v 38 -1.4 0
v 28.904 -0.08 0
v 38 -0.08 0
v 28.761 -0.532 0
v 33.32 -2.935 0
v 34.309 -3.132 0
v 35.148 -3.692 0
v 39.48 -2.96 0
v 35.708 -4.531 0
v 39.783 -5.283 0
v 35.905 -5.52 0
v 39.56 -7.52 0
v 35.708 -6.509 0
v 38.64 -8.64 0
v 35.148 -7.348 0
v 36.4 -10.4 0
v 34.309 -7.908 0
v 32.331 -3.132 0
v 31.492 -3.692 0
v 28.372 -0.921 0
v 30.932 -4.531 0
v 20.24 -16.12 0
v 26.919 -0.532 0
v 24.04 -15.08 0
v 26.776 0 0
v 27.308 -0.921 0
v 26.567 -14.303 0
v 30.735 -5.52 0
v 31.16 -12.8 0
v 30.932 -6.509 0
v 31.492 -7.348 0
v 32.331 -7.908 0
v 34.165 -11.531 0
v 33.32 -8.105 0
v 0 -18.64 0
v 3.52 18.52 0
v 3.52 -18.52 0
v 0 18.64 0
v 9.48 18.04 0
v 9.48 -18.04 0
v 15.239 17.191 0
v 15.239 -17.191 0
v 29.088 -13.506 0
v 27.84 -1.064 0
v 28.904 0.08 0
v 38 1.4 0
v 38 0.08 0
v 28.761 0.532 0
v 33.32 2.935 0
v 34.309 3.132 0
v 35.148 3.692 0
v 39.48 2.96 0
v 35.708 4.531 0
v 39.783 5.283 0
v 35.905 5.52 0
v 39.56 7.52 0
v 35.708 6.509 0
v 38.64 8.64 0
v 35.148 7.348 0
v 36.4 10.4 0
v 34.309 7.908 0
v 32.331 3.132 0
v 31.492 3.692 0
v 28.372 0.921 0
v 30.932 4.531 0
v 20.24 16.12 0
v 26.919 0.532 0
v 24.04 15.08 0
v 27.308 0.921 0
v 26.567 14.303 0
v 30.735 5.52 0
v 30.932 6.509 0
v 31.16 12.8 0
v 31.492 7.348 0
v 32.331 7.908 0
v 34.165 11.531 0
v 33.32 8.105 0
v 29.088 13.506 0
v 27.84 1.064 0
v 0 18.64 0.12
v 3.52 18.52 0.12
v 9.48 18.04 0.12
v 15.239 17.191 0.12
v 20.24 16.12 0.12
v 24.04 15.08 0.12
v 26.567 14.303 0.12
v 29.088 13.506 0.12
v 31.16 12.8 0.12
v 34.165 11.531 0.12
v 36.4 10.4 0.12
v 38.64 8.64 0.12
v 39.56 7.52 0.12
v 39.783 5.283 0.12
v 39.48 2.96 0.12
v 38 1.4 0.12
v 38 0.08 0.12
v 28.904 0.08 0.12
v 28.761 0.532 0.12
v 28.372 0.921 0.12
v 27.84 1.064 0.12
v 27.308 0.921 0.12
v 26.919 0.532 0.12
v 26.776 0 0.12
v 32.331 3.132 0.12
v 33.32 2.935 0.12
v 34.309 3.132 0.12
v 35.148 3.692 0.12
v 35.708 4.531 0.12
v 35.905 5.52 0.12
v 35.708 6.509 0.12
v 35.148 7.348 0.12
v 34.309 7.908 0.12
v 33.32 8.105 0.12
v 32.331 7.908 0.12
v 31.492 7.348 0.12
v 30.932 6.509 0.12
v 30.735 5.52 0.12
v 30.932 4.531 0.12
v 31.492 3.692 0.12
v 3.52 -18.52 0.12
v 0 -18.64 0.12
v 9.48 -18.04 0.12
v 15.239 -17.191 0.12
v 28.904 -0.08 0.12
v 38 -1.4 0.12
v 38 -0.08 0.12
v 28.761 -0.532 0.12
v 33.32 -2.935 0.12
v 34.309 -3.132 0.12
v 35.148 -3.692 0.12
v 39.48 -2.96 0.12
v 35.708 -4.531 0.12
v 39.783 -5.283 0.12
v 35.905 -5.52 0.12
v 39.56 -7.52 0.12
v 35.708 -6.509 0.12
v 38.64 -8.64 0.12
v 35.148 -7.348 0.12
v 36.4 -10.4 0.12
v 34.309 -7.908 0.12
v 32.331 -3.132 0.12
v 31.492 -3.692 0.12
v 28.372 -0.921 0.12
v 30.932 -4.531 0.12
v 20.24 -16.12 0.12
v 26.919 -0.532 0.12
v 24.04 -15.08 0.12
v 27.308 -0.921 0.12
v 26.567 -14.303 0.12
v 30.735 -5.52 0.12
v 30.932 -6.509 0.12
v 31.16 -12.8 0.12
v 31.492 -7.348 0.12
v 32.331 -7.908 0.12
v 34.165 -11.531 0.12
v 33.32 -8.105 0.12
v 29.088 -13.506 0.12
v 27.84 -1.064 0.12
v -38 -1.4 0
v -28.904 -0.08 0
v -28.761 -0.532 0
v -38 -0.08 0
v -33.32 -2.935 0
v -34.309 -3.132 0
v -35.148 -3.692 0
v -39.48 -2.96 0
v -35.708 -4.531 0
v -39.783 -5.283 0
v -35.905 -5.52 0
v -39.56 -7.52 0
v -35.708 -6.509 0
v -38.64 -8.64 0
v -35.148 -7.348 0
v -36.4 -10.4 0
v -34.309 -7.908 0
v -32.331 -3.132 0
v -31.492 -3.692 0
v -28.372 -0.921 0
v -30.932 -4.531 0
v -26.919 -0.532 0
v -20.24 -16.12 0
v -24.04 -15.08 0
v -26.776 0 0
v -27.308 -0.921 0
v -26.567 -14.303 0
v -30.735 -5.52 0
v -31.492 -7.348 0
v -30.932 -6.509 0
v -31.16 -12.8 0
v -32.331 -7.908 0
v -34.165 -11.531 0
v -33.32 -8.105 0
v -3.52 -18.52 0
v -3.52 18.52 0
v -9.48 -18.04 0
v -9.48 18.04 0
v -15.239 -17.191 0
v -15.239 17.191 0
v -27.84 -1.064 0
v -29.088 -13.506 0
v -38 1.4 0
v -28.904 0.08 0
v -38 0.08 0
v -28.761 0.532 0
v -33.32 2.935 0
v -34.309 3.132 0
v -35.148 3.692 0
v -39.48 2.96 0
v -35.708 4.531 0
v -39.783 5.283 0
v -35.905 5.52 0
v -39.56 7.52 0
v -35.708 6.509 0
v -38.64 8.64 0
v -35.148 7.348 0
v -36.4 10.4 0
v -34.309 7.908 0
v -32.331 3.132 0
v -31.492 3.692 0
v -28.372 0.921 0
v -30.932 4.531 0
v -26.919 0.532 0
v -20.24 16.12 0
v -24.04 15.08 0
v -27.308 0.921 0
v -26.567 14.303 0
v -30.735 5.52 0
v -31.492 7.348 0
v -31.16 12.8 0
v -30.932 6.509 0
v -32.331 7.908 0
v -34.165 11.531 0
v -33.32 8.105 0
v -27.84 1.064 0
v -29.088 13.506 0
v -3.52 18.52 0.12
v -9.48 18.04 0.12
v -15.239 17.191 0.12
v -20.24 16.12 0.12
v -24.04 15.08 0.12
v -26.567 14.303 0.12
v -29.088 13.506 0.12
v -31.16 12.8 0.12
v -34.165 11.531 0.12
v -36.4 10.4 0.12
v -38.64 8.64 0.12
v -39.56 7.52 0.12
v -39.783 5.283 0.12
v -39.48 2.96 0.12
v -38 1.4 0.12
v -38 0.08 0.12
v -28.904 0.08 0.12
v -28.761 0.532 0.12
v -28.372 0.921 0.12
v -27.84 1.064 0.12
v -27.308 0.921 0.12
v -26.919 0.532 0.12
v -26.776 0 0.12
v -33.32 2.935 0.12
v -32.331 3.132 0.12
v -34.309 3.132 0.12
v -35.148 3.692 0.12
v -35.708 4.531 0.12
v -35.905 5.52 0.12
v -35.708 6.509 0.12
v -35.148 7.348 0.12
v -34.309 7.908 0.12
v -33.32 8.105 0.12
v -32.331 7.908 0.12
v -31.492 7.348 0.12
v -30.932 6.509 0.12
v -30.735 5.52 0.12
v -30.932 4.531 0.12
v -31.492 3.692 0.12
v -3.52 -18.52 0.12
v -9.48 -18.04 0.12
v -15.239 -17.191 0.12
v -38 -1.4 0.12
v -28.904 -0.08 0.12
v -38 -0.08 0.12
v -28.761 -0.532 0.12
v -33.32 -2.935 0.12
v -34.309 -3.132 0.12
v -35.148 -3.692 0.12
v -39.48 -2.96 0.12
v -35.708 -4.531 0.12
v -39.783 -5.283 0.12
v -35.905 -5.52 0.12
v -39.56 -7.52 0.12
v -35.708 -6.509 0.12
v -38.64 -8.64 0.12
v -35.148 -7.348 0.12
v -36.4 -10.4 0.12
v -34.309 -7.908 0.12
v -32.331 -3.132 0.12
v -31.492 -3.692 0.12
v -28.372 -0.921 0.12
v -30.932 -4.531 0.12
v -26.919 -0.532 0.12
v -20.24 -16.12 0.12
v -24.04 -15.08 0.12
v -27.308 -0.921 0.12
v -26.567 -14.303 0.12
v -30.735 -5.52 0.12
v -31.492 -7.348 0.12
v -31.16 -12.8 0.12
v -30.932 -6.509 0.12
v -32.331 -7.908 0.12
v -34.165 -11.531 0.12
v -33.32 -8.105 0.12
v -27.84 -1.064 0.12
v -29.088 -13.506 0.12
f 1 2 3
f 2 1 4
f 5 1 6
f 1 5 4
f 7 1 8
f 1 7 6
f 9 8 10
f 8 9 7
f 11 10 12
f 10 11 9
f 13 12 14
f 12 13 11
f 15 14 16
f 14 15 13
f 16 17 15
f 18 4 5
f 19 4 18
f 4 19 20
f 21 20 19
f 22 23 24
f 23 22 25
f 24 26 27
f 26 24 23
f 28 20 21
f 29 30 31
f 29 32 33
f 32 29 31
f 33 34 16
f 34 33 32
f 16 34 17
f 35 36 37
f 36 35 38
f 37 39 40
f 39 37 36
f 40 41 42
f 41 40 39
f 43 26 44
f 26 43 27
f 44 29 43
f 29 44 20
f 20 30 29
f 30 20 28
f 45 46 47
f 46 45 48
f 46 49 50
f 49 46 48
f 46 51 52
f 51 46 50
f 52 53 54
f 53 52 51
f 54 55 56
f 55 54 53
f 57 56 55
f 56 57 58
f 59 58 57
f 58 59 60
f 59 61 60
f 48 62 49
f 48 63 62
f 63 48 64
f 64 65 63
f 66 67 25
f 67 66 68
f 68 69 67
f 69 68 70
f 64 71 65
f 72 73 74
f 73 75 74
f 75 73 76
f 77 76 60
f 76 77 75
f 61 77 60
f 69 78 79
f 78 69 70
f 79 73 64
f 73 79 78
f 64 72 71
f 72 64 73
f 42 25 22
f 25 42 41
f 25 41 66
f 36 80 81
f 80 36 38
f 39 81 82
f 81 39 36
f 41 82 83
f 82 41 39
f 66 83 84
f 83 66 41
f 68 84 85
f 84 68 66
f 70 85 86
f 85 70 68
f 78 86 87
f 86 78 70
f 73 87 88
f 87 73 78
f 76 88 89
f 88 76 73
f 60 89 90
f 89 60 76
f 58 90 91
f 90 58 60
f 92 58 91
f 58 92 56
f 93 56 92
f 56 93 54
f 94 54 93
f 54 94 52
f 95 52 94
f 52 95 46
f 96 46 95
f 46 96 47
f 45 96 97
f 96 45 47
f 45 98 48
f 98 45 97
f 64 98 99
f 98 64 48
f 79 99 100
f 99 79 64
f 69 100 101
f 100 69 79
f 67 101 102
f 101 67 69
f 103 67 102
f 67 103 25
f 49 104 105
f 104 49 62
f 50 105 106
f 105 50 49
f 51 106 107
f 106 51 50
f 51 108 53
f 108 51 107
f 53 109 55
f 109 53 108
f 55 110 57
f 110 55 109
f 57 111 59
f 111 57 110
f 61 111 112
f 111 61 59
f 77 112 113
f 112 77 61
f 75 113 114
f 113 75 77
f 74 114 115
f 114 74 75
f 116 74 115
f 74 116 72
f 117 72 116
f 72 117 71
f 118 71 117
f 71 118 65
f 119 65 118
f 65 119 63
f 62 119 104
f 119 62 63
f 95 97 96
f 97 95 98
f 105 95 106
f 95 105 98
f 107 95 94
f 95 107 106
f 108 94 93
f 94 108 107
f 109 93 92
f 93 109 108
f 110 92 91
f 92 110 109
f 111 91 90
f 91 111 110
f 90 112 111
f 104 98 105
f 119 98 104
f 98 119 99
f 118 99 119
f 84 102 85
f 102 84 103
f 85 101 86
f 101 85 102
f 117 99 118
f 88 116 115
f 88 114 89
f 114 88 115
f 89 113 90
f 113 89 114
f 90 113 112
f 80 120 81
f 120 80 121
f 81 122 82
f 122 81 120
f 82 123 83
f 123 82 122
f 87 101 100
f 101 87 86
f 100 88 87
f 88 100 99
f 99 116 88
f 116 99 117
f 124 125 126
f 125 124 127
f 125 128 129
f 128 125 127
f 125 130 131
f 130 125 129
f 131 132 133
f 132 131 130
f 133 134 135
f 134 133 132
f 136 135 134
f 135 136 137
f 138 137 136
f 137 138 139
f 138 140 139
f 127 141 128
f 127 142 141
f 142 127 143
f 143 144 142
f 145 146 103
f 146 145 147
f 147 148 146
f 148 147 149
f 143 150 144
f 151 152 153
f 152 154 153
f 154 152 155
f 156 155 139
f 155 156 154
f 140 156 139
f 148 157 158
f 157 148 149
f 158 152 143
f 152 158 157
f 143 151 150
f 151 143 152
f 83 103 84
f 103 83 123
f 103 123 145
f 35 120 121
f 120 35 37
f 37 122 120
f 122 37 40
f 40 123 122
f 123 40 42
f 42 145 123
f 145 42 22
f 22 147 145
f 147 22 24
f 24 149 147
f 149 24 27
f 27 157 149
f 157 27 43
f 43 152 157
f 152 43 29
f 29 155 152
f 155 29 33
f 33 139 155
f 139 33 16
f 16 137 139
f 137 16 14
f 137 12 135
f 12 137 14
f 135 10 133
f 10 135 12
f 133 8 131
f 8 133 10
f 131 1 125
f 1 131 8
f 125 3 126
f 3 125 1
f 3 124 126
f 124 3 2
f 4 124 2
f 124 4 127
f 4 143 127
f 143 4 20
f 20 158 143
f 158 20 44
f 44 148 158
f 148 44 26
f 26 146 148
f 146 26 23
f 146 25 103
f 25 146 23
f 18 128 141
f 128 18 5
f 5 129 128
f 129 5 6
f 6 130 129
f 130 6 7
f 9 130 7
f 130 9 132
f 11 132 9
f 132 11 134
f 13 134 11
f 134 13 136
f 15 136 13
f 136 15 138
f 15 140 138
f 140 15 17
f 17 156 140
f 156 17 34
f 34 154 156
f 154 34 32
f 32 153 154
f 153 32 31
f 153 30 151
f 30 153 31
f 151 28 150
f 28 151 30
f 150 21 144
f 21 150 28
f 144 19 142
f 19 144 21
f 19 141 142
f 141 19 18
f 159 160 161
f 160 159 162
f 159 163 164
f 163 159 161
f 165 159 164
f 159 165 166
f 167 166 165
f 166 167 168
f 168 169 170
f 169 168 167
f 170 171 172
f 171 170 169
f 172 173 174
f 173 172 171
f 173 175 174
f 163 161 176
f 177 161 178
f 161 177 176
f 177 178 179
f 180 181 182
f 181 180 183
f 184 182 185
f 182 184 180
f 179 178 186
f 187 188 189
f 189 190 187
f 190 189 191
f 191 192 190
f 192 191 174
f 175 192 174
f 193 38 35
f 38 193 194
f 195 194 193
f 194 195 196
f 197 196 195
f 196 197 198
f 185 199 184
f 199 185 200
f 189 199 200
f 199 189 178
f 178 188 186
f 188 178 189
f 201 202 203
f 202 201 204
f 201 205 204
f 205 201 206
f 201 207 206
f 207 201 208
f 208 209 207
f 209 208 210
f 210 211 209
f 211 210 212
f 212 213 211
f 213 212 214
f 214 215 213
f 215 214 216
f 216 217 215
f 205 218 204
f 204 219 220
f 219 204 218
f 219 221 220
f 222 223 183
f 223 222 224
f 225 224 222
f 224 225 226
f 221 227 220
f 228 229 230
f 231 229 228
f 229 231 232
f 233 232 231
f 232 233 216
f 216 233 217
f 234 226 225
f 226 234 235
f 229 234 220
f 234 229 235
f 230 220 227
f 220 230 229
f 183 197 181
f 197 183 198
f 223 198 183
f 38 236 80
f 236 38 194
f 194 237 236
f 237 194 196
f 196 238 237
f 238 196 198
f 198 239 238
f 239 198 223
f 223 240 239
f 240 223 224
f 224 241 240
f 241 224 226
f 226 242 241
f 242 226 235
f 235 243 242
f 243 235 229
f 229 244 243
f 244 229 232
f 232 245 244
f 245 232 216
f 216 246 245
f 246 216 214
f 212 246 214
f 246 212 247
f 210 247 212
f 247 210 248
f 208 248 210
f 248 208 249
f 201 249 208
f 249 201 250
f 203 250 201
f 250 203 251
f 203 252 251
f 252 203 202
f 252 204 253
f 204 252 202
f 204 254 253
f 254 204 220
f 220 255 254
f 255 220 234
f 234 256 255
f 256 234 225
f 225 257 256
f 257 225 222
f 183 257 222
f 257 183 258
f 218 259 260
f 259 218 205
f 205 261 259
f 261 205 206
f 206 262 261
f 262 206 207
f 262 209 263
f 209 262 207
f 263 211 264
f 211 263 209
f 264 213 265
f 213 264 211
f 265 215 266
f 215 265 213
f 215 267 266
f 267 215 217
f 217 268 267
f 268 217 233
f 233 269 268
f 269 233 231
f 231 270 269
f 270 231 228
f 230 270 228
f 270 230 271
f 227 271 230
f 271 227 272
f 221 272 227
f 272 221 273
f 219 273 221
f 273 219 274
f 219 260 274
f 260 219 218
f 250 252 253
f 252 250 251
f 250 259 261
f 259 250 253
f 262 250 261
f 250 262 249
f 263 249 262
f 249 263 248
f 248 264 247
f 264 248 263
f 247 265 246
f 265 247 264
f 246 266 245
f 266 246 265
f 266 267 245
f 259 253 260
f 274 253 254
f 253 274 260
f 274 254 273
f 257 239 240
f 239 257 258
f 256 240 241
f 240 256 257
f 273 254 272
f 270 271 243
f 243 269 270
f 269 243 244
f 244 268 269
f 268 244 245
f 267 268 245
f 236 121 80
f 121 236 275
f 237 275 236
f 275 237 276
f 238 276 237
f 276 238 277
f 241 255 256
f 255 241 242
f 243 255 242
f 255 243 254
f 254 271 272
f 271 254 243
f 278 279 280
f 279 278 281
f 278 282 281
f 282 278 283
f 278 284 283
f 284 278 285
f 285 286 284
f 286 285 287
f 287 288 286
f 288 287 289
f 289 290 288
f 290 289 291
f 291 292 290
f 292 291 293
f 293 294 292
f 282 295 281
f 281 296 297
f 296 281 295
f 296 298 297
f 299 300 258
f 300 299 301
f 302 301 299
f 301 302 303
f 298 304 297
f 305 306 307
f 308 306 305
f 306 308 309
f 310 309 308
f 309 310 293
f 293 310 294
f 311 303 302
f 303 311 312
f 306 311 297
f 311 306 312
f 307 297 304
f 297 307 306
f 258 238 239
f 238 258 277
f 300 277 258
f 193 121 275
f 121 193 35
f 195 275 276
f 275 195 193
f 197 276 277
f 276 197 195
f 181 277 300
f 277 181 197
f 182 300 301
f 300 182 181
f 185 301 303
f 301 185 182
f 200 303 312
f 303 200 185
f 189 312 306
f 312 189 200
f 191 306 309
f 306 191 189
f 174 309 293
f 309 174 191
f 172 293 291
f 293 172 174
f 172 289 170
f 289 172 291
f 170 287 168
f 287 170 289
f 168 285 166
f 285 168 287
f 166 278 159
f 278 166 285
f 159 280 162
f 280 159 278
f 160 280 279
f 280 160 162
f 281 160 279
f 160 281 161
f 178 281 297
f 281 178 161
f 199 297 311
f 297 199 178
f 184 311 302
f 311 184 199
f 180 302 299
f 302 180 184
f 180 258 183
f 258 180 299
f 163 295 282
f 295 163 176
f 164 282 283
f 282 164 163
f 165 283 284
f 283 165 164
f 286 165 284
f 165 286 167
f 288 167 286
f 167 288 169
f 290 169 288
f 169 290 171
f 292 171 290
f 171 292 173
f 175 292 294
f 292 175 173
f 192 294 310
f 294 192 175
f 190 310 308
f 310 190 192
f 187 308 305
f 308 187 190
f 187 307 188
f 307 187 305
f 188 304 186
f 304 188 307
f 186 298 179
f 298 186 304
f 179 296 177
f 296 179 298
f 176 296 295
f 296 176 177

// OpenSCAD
// file: ../p/rect3.scad
use <../lib.scad>
function ldraw_lib__rect3() = [
// 0 Rectangle with 3 Edges
// 0 Name: rect3.dat
// 0 Author: Mark Kennedy [mkennedy]
// 0 !LDRAW_ORG Primitive UPDATE 2010-01
// 0 !LICENSE Licensed under CC BY 4.0 : see CAreadme.txt
// 
// 0 BFC CERTIFY CCW
  [0,"BFC","CERTIFY"],
  [0,"BFC","CCW"],
// 
// 0 !HISTORY 2003-08-01 [PTadmin] Official Update 2003-02
// 0 !HISTORY 2007-06-24 [PTadmin] Header formatted for Contributor Agreement
// 0 !HISTORY 2008-07-01 [PTadmin] Official Update 2008-01
// 0 !HISTORY 2010-01-17 [mikeheide] Change winding to CCW
// 0 !HISTORY 2010-04-05 [PTadmin] Official Update 2010-01
// 
// 
// 2 24 1 0 1 -1 0 1
  [2,24,1,0,1,-1,0,1],
// 2 24 1 0 1 1 0 -1
  [2,24,1,0,1,1,0,-1],
// 2 24 -1 0 1 -1 0 -1
  [2,24,-1,0,1,-1,0,-1],
// 4 16 -1 0 1 -1 0 -1 1 0 -1 1 0 1
  [4,16,-1,0,1,-1,0,-1,1,0,-1,1,0,1],
// 0 //
];
module ldraw_lib__rect3(step=0, col=false, unit=2/5, alt=false, line=0.2, solid=!$preview)
    makepoly(ldraw_lib__rect3(), step=step, col=col, unit=unit, alt=alt, line=line, solid=solid);
ldraw_lib__rect3(line=0.2);
// main file
use <../lib.scad>
use <s/28981s01.scad>
function ldraw_lib__28981() = [
// 0 Sheet Fabric Oval 10 x  5
// 0 Name: 28981.dat
// 0 Author: Philippe Hurbain [Philo]
// 0 !LDRAW_ORG Part UPDATE 2020-02
// 0 !LICENSE Licensed under CC BY 4.0 : see CAreadme.txt
// 
// 0 BFC CERTIFY CCW
  [0,"BFC","CERTIFY"],
  [0,"BFC","CCW"],
// 
// 0 !CATEGORY Sheet Fabric
// 0 !KEYWORDS Hammock, Set 31063, Set 60153
// 
// 0 !HISTORY 2019-06-28 [PTadmin] Official Update 2019-01
// 0 !HISTORY 2020-06-10 [cwdee] Update description
// 0 !HISTORY 2020-09-05 [PTadmin] Official Update 2020-02
// 
// 
// 1 16 0 0 0 1 0 0 0 1 0 0 0 1 s\28981s01.dat
  [1,16,0,0,0,1,0,0,0,1,0,0,0,1, ldraw_lib__s__28981s01()],
// 1 16 0 -0.3 0 1 0 0 0 -1 0 0 0 -1 s\28981s01.dat
  [1,16,0,-0.3,0,1,0,0,0,-1,0,0,0,-1, ldraw_lib__s__28981s01()],
// 1 16 0 0 0 -1 0 0 0 1 0 0 0 1 s\28981s01.dat
  [1,16,0,0,0,-1,0,0,0,1,0,0,0,1, ldraw_lib__s__28981s01()],
// 1 16 0 -0.3 0 -1 0 0 0 -1 0 0 0 -1 s\28981s01.dat
  [1,16,0,-0.3,0,-1,0,0,0,-1,0,0,0,-1, ldraw_lib__s__28981s01()],
// 5 24 0 0 46.6 0 -0.3 46.6 8.8 -0.3 46.3 -8.8 0 46.3
  [5,24,0,0,46.6,0,-0.3,46.6,8.8,-0.3,46.3,-8.8,0,46.3],
// 5 24 66.941 -0.3 0 66.941 0 0 67.2972 0 1.3295 67.2972 -0.3 -1.3295
  [5,24,66.941,-0.3,0,66.941,0,0,67.2972,0,1.3295,67.2972,-0.3,-1.3295],
// 5 24 0 -0.3 -46.6 0 0 -46.6 8.8 0 -46.3 -8.8 -0.3 -46.3
  [5,24,0,-0.3,-46.6,0,0,-46.6,8.8,0,-46.3,-8.8,-0.3,-46.3],
// 5 24 -66.941 0 0 -66.941 -0.3 0 -67.2972 0 1.3295 -67.2972 -0.3 -1.3295
  [5,24,-66.941,0,0,-66.941,-0.3,0,-67.2972,0,1.3295,-67.2972,-0.3,-1.3295],
];
module ldraw_lib__28981(step=0, col=false, unit=2/5, alt=false, line=0.2, solid=!$preview)
    makepoly(ldraw_lib__28981(), step=step, col=col, unit=unit, alt=alt, line=line, solid=solid);
ldraw_lib__28981(line=0.2);
